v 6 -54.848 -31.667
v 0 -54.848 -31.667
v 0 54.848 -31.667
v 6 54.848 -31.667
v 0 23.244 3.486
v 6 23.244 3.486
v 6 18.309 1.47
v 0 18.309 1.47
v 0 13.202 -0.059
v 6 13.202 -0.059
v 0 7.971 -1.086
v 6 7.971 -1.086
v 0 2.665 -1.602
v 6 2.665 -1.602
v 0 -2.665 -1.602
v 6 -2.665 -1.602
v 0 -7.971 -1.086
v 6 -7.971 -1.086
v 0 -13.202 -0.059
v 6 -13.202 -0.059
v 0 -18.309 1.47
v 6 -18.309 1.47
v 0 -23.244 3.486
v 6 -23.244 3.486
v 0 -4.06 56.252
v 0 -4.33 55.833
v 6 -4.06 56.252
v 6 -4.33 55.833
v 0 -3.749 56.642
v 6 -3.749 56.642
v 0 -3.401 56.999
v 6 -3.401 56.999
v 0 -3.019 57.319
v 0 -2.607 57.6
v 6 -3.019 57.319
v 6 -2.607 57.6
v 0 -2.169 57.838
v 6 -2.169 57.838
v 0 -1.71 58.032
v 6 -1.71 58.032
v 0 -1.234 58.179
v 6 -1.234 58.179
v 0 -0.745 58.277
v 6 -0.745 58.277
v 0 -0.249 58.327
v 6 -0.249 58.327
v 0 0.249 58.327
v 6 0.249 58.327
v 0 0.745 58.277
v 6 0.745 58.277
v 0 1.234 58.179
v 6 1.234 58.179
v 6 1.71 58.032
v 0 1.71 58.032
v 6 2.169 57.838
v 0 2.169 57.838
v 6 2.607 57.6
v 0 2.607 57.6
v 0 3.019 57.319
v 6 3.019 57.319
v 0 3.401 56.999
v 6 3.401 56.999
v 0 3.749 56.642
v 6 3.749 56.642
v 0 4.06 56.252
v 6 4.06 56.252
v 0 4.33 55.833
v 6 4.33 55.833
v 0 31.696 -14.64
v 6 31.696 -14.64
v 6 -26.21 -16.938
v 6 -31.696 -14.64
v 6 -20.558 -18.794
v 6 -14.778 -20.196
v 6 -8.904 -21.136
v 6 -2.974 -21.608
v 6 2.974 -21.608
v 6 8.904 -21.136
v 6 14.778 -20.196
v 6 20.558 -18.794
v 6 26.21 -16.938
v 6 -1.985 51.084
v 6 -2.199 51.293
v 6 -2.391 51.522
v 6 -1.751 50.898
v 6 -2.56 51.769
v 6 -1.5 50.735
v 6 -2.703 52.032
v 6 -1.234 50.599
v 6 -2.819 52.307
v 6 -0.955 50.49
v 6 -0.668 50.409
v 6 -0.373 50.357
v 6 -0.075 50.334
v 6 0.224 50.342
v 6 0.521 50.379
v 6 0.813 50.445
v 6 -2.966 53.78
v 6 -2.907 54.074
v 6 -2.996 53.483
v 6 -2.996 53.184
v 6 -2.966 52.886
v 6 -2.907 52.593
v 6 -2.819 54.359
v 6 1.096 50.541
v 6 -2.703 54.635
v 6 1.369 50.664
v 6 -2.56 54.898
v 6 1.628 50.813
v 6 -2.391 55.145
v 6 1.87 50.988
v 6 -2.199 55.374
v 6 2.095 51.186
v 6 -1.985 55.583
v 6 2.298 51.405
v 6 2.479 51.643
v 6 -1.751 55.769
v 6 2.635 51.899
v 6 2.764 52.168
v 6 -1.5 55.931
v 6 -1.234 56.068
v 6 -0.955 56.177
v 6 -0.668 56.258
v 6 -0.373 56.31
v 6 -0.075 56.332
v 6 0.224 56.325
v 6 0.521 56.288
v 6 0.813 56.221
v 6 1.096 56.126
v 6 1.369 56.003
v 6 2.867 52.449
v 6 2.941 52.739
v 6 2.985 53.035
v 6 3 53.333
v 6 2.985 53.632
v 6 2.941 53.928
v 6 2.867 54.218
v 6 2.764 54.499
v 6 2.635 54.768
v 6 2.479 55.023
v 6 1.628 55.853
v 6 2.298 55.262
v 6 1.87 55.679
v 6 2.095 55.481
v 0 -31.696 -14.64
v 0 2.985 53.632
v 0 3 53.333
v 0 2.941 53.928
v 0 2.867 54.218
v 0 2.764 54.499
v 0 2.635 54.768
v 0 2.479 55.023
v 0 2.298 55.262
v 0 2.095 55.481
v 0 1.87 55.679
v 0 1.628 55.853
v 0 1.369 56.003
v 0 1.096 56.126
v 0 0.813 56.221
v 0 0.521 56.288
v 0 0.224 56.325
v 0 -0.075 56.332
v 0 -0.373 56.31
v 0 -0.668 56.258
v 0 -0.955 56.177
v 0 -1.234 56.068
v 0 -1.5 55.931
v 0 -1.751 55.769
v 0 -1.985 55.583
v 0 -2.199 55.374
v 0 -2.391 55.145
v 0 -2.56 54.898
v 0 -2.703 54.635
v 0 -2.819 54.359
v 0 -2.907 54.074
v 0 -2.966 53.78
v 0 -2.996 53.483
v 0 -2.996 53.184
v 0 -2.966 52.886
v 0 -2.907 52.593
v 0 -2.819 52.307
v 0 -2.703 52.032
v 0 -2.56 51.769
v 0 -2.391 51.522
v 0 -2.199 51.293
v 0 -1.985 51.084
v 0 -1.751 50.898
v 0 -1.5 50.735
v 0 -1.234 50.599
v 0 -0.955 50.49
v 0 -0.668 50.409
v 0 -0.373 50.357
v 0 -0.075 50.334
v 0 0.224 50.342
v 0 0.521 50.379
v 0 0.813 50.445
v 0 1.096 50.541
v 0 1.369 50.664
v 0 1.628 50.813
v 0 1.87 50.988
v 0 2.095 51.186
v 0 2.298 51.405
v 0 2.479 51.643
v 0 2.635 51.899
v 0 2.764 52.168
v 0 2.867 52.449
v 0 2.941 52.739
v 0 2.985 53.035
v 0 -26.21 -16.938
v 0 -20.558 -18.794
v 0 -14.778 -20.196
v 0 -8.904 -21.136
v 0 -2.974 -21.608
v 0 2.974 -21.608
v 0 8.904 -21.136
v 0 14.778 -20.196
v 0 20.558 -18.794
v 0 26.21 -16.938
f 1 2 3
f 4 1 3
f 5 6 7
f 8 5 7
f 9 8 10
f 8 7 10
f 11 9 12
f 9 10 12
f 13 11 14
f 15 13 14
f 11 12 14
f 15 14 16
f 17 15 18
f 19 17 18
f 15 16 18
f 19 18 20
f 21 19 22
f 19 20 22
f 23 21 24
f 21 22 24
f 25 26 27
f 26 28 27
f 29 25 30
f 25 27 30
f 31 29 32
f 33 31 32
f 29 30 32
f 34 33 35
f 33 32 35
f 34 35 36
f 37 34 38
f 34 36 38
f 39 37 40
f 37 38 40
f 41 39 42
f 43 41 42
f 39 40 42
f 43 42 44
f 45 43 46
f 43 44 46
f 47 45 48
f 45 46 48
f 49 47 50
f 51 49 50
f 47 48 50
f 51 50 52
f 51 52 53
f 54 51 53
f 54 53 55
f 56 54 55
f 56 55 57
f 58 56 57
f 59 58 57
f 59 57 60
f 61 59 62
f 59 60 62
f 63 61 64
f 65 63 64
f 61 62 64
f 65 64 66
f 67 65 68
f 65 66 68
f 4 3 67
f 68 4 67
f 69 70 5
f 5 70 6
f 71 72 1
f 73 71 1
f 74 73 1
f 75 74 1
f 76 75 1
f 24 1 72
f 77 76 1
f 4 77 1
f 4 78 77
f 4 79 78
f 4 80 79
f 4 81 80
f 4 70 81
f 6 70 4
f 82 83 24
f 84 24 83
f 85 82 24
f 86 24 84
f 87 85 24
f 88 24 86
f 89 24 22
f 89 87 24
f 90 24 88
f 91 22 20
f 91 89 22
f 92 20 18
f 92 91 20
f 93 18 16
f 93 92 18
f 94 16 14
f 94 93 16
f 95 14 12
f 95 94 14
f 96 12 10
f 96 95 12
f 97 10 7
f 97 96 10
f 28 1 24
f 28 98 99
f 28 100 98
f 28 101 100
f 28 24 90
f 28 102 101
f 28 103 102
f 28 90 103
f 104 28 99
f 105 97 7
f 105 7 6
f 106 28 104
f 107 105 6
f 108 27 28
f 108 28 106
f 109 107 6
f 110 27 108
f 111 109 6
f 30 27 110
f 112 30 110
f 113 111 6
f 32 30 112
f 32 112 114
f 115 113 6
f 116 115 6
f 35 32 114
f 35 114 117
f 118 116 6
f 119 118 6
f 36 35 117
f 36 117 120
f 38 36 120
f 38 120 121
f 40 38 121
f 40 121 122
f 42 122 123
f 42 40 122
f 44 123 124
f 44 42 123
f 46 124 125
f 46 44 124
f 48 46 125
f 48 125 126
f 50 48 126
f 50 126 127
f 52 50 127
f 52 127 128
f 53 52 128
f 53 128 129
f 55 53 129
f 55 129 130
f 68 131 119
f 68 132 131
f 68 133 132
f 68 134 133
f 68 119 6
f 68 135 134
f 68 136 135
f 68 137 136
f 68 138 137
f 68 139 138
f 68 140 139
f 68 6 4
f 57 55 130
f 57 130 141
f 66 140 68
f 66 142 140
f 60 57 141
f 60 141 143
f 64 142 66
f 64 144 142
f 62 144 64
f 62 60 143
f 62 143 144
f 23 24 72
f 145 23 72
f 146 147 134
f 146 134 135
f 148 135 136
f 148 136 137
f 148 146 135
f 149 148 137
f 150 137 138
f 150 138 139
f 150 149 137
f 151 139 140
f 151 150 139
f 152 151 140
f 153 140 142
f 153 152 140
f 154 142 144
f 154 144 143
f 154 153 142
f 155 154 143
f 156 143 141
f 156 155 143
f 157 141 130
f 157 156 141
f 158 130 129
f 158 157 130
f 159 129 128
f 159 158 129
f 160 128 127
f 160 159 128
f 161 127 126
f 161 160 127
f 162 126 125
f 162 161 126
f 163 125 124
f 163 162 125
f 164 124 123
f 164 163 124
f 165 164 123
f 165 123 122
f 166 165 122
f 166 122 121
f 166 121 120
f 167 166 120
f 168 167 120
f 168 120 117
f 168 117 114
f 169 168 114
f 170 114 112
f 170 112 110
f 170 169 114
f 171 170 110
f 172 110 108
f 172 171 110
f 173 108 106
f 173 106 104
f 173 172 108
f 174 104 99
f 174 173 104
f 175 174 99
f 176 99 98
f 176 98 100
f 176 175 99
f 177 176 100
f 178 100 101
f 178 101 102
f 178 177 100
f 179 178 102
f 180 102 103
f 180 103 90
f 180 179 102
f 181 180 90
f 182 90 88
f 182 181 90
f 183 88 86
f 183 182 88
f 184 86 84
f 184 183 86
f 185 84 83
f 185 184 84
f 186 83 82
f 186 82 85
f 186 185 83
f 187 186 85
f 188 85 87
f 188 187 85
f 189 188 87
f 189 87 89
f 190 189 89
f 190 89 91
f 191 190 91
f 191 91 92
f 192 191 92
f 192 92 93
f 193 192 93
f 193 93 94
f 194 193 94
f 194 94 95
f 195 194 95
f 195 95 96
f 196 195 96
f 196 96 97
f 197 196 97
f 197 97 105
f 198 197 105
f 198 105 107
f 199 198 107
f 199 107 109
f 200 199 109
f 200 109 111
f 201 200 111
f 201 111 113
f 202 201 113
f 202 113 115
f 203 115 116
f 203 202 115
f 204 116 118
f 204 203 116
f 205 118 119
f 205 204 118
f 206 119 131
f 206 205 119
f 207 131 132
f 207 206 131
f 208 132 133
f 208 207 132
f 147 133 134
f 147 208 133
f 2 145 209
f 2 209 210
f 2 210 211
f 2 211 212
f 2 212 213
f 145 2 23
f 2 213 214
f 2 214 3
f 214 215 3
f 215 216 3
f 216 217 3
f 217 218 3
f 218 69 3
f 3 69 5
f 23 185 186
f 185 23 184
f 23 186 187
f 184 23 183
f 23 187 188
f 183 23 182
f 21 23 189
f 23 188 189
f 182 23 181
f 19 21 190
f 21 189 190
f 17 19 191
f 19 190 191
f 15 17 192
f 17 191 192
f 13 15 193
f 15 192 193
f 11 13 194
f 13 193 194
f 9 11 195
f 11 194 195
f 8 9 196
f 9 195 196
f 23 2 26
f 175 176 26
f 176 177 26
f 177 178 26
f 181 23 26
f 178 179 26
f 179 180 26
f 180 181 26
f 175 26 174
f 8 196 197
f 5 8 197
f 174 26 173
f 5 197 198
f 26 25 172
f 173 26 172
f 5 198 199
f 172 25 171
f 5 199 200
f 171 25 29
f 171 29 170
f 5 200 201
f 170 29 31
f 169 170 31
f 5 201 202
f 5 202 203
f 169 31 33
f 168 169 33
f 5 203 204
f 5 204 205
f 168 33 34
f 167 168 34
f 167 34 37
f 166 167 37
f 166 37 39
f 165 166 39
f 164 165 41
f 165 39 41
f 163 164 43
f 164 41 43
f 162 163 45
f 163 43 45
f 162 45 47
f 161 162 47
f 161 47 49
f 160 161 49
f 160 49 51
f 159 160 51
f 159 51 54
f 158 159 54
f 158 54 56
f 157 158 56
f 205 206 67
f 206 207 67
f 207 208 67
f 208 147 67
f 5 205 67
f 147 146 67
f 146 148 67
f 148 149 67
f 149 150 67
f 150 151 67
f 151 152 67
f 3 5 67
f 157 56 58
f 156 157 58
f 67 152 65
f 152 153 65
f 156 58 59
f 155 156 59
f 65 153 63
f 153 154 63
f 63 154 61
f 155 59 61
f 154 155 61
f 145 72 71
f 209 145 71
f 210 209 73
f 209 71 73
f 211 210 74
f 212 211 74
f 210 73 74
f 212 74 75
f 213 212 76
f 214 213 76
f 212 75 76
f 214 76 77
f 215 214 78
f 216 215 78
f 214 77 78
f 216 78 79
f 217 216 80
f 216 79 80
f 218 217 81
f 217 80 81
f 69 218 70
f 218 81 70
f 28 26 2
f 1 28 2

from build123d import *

# Parameters (mm, degrees)
F0_R     = 3
F1_DEPTH = 6
F3_DEPTH = 6
F4_R     = 5


with BuildPart() as f1:
    # F0 (on Right) → F1 (new body)
    with BuildSketch(Plane.YZ):
        Polygon((0, 63.333333), (-54.848276, -31.666667), (54.848276, -31.666667), align=None)
        with Locations((0, 53.333333)):
            Circle(F0_R, mode=Mode.SUBTRACT)
    extrude(amount=F1_DEPTH)

    # F2 (on face) → F3 (cut, through all)
    with BuildSketch(Plane.YZ.offset(6)):
        with BuildLine():
            ThreePointArc((23.244004, 3.486405), (0, -1.666667), (-23.244004, 3.486405))
            Line((-23.244004, 3.486405), (-31.69637, -14.639751))
            ThreePointArc((-31.69637, -14.639751), (0, -21.666667), (31.69637, -14.639751))
            Line((31.69637, -14.639751), (23.244004, 3.486405))
        make_face()
    extrude(amount=-F3_DEPTH, mode=Mode.SUBTRACT)

    # F4
    f4_edges = [f1.edges().sort_by_distance(p)[0] for p in [
        (3, 0, 63.333333),
    ]]
    fillet(f4_edges, radius=F4_R)


solid = f1.part
